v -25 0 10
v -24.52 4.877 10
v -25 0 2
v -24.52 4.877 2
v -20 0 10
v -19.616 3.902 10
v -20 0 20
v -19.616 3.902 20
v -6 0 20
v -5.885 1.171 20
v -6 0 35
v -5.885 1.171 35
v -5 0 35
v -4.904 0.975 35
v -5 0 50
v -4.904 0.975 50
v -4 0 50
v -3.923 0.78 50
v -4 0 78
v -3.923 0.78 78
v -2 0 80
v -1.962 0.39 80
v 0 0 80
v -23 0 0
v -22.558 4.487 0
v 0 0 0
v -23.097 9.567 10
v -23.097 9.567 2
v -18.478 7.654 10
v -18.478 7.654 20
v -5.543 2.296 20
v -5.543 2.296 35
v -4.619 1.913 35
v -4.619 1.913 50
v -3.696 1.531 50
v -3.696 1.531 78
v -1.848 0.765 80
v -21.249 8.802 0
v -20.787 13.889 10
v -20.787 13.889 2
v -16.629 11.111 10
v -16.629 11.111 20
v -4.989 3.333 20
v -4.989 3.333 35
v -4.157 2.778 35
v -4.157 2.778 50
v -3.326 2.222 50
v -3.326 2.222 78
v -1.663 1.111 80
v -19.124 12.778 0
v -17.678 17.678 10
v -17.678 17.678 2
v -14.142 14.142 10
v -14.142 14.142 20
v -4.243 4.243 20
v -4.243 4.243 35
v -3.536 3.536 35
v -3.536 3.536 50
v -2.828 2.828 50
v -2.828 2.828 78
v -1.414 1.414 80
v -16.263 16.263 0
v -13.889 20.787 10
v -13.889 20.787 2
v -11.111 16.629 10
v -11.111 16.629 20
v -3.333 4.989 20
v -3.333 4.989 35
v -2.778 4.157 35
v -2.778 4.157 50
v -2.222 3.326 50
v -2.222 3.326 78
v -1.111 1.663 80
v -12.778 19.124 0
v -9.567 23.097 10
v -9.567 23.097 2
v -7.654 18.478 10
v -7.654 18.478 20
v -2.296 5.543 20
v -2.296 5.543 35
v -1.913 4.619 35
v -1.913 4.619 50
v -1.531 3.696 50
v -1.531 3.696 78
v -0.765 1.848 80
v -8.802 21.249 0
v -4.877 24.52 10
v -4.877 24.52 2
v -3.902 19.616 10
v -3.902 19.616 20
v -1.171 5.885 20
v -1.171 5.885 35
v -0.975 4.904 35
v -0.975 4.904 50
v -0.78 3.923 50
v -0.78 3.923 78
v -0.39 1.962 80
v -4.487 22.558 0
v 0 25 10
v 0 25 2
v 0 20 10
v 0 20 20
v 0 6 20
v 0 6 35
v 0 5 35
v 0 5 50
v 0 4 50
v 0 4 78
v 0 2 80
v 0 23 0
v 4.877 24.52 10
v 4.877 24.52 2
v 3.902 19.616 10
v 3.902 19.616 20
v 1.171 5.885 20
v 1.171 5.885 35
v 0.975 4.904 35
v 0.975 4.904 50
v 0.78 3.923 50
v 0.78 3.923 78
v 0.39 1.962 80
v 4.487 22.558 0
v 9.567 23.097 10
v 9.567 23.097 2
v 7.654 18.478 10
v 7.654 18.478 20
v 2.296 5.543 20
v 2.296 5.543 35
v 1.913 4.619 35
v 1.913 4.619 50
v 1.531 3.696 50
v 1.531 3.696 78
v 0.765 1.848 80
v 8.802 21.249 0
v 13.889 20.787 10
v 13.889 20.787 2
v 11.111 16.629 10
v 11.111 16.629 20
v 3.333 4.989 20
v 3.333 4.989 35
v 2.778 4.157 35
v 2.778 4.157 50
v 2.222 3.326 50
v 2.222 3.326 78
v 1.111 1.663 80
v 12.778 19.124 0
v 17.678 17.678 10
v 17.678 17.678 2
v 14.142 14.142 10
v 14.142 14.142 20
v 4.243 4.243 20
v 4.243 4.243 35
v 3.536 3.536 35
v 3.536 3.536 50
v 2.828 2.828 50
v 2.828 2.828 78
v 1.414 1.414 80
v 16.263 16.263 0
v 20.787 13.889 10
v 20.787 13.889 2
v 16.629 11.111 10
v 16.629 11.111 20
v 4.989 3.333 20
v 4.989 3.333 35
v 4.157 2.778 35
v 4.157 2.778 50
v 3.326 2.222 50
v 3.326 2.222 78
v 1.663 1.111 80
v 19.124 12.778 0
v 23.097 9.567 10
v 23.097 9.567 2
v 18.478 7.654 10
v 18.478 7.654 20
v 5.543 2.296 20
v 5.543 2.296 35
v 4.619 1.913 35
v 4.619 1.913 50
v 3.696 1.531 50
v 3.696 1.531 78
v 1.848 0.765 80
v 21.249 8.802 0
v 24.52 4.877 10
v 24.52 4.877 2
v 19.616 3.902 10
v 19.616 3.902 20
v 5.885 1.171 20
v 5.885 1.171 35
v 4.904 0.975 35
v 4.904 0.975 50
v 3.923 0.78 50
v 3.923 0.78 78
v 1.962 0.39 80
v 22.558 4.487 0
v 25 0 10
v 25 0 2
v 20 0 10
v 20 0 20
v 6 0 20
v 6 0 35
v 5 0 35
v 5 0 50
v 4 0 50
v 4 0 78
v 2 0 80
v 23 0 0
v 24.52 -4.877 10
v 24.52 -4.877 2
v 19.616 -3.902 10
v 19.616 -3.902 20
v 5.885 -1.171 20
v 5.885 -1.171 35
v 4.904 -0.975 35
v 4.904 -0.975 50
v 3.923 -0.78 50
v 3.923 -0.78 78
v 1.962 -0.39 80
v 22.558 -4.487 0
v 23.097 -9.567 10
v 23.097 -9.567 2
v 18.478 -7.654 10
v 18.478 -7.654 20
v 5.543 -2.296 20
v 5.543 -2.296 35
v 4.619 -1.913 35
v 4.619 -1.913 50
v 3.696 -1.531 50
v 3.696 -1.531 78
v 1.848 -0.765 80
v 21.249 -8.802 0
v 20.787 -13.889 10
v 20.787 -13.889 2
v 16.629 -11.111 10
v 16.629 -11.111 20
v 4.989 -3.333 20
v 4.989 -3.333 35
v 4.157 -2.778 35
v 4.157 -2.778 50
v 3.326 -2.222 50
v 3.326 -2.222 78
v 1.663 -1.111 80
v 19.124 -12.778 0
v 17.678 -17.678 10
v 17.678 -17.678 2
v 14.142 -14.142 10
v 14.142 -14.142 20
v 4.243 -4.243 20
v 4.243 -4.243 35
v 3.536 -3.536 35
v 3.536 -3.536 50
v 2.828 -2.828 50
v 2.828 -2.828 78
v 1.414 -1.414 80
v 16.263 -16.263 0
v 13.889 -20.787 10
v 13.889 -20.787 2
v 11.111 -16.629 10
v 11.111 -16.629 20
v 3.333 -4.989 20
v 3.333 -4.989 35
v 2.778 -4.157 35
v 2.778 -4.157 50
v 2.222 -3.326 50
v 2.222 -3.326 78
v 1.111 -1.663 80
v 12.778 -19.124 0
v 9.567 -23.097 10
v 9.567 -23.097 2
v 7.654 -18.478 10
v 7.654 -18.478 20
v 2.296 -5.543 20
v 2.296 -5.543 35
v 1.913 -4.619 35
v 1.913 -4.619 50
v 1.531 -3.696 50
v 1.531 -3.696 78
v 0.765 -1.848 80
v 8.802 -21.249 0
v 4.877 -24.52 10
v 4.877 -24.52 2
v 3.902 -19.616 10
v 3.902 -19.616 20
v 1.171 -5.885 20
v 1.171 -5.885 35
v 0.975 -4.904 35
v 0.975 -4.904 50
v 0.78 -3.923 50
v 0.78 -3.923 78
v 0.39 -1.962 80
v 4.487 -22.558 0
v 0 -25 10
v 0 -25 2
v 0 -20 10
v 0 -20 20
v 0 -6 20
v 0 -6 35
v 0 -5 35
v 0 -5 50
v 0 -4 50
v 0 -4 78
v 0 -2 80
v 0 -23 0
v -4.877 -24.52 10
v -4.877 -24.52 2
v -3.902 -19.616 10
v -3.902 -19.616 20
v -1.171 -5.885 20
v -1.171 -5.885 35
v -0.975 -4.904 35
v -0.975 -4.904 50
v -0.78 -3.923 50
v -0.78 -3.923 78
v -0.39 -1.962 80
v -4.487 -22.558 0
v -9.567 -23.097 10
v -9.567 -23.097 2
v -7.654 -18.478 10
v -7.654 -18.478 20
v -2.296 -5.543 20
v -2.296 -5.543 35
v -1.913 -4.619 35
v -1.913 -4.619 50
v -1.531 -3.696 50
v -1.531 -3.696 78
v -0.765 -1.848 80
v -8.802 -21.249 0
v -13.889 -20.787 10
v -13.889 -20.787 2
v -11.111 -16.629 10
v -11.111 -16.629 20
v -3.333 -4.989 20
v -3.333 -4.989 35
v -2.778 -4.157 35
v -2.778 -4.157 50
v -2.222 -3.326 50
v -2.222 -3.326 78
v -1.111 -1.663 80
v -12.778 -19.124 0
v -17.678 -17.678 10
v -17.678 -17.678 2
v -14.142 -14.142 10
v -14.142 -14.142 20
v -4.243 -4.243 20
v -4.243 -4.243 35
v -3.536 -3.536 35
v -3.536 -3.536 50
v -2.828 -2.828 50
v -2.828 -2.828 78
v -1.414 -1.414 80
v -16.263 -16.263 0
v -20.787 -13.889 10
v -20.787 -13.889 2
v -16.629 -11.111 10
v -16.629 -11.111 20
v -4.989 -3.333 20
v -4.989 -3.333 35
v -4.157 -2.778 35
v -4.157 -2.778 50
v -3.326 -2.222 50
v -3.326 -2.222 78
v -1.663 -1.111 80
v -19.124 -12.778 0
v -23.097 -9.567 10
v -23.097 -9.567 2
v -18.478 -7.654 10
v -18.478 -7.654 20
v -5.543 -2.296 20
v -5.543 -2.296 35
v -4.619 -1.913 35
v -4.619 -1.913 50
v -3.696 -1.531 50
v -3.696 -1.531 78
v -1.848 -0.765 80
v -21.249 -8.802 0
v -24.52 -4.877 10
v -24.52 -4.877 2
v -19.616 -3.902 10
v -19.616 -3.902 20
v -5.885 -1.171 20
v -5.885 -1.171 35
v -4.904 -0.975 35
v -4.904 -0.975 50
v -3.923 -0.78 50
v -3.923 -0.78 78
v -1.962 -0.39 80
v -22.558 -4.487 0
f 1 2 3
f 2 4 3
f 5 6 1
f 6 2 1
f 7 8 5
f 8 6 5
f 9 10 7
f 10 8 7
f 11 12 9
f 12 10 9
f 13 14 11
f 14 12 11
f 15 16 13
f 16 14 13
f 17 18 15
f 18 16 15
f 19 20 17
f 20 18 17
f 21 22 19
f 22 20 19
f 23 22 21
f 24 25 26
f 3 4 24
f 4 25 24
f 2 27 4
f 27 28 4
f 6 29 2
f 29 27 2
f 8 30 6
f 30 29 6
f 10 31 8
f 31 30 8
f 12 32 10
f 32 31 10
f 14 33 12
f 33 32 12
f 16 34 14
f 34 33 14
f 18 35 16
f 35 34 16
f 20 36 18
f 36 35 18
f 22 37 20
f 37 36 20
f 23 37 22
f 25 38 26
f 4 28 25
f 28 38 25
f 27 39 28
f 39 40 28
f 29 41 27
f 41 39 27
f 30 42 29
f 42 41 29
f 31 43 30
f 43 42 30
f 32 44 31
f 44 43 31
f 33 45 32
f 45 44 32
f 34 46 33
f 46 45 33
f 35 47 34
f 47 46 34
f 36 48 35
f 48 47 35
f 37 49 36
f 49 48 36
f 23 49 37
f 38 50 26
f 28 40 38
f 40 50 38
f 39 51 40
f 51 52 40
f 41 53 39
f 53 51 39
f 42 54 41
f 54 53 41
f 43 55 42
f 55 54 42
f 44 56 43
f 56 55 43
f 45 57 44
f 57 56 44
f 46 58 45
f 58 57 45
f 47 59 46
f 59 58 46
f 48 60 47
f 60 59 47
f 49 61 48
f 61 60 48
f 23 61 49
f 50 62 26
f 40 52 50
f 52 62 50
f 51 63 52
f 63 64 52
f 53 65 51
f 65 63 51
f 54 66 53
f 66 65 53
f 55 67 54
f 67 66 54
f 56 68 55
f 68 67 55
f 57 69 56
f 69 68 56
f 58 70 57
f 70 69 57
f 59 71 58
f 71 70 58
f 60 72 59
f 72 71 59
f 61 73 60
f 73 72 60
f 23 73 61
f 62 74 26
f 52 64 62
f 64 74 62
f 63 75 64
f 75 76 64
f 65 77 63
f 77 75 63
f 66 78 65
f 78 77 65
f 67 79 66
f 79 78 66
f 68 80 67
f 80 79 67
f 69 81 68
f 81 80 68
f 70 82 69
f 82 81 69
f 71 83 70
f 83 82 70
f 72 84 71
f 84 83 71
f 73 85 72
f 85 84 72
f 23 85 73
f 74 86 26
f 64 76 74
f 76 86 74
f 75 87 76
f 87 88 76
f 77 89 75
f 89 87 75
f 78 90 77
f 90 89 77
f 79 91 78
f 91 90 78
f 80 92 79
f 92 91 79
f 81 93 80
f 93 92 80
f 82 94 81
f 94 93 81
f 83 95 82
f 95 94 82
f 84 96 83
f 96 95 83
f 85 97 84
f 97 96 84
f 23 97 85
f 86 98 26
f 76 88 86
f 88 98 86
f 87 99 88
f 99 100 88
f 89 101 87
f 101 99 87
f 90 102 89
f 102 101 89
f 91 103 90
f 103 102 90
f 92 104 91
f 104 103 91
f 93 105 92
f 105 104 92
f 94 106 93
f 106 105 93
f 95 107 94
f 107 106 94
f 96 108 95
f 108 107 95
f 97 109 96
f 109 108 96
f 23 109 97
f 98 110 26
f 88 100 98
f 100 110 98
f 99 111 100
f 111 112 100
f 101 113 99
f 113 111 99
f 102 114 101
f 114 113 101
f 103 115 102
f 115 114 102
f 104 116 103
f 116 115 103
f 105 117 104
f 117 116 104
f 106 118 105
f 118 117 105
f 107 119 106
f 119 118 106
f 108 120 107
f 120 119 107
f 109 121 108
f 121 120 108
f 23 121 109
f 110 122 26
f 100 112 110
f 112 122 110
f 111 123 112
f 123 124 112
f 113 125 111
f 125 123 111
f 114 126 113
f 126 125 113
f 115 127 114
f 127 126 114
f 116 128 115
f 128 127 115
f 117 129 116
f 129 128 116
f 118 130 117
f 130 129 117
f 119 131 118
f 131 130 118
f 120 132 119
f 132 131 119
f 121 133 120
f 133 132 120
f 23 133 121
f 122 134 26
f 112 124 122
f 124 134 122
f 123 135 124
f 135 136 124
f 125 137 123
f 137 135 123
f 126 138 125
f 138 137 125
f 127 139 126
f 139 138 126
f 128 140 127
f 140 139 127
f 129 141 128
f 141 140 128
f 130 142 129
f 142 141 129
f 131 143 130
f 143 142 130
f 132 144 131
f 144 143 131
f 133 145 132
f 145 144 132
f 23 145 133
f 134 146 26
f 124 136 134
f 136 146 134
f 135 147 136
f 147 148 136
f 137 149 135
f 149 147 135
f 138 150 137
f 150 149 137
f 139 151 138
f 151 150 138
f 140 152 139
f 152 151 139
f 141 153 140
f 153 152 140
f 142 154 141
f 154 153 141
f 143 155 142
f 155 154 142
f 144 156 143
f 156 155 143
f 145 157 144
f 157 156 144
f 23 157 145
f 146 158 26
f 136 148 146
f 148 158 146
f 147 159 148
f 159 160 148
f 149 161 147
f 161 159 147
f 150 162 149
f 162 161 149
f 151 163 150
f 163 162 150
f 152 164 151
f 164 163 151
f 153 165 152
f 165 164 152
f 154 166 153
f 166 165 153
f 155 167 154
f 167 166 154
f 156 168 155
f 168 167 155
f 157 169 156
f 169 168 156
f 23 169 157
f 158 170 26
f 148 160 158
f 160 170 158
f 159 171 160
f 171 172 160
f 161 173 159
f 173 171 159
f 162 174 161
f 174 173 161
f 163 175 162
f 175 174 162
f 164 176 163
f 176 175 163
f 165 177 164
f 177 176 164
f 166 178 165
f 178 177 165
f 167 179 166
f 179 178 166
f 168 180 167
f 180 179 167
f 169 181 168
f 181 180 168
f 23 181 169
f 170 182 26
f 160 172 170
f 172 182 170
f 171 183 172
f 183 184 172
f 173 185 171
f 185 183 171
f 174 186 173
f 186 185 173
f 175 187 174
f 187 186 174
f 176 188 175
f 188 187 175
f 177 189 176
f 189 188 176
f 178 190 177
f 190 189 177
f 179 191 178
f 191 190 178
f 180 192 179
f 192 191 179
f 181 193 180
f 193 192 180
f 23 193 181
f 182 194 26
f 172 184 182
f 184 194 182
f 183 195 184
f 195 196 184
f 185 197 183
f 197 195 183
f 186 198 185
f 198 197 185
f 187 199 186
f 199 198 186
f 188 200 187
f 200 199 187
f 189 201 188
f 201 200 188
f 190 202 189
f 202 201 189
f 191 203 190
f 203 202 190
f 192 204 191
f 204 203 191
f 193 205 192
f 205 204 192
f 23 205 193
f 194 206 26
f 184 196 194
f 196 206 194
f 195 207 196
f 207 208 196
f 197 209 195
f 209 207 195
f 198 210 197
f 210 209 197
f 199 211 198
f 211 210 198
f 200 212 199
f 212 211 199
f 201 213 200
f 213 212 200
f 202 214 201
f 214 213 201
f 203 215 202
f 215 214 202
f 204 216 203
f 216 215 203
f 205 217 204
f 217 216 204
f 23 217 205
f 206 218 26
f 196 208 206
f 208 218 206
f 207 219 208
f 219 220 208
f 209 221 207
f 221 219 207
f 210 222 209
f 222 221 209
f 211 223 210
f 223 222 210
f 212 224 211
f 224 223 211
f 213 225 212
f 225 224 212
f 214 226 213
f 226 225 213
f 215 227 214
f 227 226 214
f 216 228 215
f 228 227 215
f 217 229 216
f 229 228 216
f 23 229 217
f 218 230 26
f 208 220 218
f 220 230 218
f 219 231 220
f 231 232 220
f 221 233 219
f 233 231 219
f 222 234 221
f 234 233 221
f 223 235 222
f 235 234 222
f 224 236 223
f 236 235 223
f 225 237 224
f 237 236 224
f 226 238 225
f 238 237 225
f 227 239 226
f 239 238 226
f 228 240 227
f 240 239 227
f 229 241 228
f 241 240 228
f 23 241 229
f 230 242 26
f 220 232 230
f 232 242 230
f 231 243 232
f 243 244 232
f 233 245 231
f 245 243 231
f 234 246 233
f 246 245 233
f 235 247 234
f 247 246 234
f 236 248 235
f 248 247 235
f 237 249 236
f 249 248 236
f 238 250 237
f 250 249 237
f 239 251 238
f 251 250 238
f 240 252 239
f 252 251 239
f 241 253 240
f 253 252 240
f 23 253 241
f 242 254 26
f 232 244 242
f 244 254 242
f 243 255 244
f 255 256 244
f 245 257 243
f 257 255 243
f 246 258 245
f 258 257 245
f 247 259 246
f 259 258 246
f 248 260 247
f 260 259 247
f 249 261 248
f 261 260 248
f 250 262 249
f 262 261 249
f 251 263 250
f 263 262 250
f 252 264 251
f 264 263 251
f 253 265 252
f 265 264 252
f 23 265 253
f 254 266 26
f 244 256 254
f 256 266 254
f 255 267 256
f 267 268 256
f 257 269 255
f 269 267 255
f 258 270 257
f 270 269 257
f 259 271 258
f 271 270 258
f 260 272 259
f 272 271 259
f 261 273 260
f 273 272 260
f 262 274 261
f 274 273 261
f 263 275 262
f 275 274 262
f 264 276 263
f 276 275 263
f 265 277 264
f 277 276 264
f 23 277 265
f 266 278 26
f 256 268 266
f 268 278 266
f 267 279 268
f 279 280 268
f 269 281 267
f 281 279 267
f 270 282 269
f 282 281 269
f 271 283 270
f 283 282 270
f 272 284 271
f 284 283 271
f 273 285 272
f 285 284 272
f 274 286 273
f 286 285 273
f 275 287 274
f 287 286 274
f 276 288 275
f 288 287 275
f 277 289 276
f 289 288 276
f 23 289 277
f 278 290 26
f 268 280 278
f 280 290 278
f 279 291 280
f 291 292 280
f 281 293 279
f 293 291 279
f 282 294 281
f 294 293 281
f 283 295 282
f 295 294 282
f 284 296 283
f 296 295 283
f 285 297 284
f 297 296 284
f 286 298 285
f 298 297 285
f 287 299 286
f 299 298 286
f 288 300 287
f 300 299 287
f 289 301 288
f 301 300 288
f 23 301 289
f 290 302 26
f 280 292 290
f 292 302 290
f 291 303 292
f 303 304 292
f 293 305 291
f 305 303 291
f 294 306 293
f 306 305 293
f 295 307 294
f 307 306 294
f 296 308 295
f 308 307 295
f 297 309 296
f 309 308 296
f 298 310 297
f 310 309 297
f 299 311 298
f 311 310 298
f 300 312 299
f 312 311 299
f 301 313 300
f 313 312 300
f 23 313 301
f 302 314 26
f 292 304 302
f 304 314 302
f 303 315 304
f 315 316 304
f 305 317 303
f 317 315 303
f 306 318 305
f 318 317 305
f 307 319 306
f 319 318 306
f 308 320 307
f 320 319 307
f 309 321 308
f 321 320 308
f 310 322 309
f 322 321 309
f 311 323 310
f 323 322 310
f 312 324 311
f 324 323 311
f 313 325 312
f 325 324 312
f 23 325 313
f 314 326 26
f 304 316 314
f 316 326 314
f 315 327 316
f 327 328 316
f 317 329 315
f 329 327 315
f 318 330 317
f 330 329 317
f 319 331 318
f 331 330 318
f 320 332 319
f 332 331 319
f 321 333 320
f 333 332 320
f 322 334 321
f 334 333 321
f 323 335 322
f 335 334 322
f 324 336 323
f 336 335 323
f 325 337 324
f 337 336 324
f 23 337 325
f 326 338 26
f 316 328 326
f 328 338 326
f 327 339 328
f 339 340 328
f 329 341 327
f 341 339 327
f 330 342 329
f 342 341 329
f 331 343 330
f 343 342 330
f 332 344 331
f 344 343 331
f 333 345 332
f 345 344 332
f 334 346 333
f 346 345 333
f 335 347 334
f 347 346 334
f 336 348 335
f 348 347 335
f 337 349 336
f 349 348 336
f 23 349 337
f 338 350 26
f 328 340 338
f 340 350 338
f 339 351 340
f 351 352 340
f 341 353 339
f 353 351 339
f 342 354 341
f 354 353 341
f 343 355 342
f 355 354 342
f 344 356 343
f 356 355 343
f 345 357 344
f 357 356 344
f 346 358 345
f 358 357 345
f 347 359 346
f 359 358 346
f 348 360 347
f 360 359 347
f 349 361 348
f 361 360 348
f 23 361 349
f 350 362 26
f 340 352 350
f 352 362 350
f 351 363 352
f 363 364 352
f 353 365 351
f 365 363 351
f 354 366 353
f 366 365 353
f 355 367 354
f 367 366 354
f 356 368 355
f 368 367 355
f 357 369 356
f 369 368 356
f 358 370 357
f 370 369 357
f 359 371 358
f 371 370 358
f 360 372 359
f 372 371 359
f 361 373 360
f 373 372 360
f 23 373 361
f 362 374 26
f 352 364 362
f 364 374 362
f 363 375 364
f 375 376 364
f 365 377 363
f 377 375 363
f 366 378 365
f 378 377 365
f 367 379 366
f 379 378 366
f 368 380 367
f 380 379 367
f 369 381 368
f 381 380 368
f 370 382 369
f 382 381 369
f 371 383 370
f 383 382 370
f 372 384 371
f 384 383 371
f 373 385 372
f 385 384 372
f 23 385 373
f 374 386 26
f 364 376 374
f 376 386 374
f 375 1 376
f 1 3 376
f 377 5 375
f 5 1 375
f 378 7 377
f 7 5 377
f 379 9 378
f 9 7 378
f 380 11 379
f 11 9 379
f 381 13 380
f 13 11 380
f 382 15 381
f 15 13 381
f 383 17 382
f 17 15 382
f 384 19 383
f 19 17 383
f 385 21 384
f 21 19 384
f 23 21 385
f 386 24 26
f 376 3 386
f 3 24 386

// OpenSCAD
$fn = 32;

// ----------------------------------------------------------------------
// Stepped shaft: diameters 50, 40, 12, 10, 8 mm, 80 mm long
// ----------------------------------------------------------------------

// --- parameters (mm) ---
d1 = 50;                  // step 1 diameter
len1 = 10;                // step 1 length
d2 = 40;                  // step 2 diameter
len2 = 10;                // step 2 length
d3 = 12;                  // step 3 diameter
len3 = 15;                // step 3 length
d4 = 10;                  // step 4 diameter
len4 = 15;                // step 4 length
d5 = 8;                   // step 5 diameter
len5 = 30;                // step 5 length
total = 80;               // overall length
chamfer = 2;              // end chamfer

/* closed turning profile: x is the radius, y is the length */
profile = [[0, 0], [25 - chamfer, 0], [25, chamfer], [25, 10], [20, 10], [20, 20], [6, 20], [6, 35], [5, 35], [5, 50], [4, 50], [4, 78], [2, 80], [0, 80]];

difference() {
  rotate_extrude() polygon(profile);
}
